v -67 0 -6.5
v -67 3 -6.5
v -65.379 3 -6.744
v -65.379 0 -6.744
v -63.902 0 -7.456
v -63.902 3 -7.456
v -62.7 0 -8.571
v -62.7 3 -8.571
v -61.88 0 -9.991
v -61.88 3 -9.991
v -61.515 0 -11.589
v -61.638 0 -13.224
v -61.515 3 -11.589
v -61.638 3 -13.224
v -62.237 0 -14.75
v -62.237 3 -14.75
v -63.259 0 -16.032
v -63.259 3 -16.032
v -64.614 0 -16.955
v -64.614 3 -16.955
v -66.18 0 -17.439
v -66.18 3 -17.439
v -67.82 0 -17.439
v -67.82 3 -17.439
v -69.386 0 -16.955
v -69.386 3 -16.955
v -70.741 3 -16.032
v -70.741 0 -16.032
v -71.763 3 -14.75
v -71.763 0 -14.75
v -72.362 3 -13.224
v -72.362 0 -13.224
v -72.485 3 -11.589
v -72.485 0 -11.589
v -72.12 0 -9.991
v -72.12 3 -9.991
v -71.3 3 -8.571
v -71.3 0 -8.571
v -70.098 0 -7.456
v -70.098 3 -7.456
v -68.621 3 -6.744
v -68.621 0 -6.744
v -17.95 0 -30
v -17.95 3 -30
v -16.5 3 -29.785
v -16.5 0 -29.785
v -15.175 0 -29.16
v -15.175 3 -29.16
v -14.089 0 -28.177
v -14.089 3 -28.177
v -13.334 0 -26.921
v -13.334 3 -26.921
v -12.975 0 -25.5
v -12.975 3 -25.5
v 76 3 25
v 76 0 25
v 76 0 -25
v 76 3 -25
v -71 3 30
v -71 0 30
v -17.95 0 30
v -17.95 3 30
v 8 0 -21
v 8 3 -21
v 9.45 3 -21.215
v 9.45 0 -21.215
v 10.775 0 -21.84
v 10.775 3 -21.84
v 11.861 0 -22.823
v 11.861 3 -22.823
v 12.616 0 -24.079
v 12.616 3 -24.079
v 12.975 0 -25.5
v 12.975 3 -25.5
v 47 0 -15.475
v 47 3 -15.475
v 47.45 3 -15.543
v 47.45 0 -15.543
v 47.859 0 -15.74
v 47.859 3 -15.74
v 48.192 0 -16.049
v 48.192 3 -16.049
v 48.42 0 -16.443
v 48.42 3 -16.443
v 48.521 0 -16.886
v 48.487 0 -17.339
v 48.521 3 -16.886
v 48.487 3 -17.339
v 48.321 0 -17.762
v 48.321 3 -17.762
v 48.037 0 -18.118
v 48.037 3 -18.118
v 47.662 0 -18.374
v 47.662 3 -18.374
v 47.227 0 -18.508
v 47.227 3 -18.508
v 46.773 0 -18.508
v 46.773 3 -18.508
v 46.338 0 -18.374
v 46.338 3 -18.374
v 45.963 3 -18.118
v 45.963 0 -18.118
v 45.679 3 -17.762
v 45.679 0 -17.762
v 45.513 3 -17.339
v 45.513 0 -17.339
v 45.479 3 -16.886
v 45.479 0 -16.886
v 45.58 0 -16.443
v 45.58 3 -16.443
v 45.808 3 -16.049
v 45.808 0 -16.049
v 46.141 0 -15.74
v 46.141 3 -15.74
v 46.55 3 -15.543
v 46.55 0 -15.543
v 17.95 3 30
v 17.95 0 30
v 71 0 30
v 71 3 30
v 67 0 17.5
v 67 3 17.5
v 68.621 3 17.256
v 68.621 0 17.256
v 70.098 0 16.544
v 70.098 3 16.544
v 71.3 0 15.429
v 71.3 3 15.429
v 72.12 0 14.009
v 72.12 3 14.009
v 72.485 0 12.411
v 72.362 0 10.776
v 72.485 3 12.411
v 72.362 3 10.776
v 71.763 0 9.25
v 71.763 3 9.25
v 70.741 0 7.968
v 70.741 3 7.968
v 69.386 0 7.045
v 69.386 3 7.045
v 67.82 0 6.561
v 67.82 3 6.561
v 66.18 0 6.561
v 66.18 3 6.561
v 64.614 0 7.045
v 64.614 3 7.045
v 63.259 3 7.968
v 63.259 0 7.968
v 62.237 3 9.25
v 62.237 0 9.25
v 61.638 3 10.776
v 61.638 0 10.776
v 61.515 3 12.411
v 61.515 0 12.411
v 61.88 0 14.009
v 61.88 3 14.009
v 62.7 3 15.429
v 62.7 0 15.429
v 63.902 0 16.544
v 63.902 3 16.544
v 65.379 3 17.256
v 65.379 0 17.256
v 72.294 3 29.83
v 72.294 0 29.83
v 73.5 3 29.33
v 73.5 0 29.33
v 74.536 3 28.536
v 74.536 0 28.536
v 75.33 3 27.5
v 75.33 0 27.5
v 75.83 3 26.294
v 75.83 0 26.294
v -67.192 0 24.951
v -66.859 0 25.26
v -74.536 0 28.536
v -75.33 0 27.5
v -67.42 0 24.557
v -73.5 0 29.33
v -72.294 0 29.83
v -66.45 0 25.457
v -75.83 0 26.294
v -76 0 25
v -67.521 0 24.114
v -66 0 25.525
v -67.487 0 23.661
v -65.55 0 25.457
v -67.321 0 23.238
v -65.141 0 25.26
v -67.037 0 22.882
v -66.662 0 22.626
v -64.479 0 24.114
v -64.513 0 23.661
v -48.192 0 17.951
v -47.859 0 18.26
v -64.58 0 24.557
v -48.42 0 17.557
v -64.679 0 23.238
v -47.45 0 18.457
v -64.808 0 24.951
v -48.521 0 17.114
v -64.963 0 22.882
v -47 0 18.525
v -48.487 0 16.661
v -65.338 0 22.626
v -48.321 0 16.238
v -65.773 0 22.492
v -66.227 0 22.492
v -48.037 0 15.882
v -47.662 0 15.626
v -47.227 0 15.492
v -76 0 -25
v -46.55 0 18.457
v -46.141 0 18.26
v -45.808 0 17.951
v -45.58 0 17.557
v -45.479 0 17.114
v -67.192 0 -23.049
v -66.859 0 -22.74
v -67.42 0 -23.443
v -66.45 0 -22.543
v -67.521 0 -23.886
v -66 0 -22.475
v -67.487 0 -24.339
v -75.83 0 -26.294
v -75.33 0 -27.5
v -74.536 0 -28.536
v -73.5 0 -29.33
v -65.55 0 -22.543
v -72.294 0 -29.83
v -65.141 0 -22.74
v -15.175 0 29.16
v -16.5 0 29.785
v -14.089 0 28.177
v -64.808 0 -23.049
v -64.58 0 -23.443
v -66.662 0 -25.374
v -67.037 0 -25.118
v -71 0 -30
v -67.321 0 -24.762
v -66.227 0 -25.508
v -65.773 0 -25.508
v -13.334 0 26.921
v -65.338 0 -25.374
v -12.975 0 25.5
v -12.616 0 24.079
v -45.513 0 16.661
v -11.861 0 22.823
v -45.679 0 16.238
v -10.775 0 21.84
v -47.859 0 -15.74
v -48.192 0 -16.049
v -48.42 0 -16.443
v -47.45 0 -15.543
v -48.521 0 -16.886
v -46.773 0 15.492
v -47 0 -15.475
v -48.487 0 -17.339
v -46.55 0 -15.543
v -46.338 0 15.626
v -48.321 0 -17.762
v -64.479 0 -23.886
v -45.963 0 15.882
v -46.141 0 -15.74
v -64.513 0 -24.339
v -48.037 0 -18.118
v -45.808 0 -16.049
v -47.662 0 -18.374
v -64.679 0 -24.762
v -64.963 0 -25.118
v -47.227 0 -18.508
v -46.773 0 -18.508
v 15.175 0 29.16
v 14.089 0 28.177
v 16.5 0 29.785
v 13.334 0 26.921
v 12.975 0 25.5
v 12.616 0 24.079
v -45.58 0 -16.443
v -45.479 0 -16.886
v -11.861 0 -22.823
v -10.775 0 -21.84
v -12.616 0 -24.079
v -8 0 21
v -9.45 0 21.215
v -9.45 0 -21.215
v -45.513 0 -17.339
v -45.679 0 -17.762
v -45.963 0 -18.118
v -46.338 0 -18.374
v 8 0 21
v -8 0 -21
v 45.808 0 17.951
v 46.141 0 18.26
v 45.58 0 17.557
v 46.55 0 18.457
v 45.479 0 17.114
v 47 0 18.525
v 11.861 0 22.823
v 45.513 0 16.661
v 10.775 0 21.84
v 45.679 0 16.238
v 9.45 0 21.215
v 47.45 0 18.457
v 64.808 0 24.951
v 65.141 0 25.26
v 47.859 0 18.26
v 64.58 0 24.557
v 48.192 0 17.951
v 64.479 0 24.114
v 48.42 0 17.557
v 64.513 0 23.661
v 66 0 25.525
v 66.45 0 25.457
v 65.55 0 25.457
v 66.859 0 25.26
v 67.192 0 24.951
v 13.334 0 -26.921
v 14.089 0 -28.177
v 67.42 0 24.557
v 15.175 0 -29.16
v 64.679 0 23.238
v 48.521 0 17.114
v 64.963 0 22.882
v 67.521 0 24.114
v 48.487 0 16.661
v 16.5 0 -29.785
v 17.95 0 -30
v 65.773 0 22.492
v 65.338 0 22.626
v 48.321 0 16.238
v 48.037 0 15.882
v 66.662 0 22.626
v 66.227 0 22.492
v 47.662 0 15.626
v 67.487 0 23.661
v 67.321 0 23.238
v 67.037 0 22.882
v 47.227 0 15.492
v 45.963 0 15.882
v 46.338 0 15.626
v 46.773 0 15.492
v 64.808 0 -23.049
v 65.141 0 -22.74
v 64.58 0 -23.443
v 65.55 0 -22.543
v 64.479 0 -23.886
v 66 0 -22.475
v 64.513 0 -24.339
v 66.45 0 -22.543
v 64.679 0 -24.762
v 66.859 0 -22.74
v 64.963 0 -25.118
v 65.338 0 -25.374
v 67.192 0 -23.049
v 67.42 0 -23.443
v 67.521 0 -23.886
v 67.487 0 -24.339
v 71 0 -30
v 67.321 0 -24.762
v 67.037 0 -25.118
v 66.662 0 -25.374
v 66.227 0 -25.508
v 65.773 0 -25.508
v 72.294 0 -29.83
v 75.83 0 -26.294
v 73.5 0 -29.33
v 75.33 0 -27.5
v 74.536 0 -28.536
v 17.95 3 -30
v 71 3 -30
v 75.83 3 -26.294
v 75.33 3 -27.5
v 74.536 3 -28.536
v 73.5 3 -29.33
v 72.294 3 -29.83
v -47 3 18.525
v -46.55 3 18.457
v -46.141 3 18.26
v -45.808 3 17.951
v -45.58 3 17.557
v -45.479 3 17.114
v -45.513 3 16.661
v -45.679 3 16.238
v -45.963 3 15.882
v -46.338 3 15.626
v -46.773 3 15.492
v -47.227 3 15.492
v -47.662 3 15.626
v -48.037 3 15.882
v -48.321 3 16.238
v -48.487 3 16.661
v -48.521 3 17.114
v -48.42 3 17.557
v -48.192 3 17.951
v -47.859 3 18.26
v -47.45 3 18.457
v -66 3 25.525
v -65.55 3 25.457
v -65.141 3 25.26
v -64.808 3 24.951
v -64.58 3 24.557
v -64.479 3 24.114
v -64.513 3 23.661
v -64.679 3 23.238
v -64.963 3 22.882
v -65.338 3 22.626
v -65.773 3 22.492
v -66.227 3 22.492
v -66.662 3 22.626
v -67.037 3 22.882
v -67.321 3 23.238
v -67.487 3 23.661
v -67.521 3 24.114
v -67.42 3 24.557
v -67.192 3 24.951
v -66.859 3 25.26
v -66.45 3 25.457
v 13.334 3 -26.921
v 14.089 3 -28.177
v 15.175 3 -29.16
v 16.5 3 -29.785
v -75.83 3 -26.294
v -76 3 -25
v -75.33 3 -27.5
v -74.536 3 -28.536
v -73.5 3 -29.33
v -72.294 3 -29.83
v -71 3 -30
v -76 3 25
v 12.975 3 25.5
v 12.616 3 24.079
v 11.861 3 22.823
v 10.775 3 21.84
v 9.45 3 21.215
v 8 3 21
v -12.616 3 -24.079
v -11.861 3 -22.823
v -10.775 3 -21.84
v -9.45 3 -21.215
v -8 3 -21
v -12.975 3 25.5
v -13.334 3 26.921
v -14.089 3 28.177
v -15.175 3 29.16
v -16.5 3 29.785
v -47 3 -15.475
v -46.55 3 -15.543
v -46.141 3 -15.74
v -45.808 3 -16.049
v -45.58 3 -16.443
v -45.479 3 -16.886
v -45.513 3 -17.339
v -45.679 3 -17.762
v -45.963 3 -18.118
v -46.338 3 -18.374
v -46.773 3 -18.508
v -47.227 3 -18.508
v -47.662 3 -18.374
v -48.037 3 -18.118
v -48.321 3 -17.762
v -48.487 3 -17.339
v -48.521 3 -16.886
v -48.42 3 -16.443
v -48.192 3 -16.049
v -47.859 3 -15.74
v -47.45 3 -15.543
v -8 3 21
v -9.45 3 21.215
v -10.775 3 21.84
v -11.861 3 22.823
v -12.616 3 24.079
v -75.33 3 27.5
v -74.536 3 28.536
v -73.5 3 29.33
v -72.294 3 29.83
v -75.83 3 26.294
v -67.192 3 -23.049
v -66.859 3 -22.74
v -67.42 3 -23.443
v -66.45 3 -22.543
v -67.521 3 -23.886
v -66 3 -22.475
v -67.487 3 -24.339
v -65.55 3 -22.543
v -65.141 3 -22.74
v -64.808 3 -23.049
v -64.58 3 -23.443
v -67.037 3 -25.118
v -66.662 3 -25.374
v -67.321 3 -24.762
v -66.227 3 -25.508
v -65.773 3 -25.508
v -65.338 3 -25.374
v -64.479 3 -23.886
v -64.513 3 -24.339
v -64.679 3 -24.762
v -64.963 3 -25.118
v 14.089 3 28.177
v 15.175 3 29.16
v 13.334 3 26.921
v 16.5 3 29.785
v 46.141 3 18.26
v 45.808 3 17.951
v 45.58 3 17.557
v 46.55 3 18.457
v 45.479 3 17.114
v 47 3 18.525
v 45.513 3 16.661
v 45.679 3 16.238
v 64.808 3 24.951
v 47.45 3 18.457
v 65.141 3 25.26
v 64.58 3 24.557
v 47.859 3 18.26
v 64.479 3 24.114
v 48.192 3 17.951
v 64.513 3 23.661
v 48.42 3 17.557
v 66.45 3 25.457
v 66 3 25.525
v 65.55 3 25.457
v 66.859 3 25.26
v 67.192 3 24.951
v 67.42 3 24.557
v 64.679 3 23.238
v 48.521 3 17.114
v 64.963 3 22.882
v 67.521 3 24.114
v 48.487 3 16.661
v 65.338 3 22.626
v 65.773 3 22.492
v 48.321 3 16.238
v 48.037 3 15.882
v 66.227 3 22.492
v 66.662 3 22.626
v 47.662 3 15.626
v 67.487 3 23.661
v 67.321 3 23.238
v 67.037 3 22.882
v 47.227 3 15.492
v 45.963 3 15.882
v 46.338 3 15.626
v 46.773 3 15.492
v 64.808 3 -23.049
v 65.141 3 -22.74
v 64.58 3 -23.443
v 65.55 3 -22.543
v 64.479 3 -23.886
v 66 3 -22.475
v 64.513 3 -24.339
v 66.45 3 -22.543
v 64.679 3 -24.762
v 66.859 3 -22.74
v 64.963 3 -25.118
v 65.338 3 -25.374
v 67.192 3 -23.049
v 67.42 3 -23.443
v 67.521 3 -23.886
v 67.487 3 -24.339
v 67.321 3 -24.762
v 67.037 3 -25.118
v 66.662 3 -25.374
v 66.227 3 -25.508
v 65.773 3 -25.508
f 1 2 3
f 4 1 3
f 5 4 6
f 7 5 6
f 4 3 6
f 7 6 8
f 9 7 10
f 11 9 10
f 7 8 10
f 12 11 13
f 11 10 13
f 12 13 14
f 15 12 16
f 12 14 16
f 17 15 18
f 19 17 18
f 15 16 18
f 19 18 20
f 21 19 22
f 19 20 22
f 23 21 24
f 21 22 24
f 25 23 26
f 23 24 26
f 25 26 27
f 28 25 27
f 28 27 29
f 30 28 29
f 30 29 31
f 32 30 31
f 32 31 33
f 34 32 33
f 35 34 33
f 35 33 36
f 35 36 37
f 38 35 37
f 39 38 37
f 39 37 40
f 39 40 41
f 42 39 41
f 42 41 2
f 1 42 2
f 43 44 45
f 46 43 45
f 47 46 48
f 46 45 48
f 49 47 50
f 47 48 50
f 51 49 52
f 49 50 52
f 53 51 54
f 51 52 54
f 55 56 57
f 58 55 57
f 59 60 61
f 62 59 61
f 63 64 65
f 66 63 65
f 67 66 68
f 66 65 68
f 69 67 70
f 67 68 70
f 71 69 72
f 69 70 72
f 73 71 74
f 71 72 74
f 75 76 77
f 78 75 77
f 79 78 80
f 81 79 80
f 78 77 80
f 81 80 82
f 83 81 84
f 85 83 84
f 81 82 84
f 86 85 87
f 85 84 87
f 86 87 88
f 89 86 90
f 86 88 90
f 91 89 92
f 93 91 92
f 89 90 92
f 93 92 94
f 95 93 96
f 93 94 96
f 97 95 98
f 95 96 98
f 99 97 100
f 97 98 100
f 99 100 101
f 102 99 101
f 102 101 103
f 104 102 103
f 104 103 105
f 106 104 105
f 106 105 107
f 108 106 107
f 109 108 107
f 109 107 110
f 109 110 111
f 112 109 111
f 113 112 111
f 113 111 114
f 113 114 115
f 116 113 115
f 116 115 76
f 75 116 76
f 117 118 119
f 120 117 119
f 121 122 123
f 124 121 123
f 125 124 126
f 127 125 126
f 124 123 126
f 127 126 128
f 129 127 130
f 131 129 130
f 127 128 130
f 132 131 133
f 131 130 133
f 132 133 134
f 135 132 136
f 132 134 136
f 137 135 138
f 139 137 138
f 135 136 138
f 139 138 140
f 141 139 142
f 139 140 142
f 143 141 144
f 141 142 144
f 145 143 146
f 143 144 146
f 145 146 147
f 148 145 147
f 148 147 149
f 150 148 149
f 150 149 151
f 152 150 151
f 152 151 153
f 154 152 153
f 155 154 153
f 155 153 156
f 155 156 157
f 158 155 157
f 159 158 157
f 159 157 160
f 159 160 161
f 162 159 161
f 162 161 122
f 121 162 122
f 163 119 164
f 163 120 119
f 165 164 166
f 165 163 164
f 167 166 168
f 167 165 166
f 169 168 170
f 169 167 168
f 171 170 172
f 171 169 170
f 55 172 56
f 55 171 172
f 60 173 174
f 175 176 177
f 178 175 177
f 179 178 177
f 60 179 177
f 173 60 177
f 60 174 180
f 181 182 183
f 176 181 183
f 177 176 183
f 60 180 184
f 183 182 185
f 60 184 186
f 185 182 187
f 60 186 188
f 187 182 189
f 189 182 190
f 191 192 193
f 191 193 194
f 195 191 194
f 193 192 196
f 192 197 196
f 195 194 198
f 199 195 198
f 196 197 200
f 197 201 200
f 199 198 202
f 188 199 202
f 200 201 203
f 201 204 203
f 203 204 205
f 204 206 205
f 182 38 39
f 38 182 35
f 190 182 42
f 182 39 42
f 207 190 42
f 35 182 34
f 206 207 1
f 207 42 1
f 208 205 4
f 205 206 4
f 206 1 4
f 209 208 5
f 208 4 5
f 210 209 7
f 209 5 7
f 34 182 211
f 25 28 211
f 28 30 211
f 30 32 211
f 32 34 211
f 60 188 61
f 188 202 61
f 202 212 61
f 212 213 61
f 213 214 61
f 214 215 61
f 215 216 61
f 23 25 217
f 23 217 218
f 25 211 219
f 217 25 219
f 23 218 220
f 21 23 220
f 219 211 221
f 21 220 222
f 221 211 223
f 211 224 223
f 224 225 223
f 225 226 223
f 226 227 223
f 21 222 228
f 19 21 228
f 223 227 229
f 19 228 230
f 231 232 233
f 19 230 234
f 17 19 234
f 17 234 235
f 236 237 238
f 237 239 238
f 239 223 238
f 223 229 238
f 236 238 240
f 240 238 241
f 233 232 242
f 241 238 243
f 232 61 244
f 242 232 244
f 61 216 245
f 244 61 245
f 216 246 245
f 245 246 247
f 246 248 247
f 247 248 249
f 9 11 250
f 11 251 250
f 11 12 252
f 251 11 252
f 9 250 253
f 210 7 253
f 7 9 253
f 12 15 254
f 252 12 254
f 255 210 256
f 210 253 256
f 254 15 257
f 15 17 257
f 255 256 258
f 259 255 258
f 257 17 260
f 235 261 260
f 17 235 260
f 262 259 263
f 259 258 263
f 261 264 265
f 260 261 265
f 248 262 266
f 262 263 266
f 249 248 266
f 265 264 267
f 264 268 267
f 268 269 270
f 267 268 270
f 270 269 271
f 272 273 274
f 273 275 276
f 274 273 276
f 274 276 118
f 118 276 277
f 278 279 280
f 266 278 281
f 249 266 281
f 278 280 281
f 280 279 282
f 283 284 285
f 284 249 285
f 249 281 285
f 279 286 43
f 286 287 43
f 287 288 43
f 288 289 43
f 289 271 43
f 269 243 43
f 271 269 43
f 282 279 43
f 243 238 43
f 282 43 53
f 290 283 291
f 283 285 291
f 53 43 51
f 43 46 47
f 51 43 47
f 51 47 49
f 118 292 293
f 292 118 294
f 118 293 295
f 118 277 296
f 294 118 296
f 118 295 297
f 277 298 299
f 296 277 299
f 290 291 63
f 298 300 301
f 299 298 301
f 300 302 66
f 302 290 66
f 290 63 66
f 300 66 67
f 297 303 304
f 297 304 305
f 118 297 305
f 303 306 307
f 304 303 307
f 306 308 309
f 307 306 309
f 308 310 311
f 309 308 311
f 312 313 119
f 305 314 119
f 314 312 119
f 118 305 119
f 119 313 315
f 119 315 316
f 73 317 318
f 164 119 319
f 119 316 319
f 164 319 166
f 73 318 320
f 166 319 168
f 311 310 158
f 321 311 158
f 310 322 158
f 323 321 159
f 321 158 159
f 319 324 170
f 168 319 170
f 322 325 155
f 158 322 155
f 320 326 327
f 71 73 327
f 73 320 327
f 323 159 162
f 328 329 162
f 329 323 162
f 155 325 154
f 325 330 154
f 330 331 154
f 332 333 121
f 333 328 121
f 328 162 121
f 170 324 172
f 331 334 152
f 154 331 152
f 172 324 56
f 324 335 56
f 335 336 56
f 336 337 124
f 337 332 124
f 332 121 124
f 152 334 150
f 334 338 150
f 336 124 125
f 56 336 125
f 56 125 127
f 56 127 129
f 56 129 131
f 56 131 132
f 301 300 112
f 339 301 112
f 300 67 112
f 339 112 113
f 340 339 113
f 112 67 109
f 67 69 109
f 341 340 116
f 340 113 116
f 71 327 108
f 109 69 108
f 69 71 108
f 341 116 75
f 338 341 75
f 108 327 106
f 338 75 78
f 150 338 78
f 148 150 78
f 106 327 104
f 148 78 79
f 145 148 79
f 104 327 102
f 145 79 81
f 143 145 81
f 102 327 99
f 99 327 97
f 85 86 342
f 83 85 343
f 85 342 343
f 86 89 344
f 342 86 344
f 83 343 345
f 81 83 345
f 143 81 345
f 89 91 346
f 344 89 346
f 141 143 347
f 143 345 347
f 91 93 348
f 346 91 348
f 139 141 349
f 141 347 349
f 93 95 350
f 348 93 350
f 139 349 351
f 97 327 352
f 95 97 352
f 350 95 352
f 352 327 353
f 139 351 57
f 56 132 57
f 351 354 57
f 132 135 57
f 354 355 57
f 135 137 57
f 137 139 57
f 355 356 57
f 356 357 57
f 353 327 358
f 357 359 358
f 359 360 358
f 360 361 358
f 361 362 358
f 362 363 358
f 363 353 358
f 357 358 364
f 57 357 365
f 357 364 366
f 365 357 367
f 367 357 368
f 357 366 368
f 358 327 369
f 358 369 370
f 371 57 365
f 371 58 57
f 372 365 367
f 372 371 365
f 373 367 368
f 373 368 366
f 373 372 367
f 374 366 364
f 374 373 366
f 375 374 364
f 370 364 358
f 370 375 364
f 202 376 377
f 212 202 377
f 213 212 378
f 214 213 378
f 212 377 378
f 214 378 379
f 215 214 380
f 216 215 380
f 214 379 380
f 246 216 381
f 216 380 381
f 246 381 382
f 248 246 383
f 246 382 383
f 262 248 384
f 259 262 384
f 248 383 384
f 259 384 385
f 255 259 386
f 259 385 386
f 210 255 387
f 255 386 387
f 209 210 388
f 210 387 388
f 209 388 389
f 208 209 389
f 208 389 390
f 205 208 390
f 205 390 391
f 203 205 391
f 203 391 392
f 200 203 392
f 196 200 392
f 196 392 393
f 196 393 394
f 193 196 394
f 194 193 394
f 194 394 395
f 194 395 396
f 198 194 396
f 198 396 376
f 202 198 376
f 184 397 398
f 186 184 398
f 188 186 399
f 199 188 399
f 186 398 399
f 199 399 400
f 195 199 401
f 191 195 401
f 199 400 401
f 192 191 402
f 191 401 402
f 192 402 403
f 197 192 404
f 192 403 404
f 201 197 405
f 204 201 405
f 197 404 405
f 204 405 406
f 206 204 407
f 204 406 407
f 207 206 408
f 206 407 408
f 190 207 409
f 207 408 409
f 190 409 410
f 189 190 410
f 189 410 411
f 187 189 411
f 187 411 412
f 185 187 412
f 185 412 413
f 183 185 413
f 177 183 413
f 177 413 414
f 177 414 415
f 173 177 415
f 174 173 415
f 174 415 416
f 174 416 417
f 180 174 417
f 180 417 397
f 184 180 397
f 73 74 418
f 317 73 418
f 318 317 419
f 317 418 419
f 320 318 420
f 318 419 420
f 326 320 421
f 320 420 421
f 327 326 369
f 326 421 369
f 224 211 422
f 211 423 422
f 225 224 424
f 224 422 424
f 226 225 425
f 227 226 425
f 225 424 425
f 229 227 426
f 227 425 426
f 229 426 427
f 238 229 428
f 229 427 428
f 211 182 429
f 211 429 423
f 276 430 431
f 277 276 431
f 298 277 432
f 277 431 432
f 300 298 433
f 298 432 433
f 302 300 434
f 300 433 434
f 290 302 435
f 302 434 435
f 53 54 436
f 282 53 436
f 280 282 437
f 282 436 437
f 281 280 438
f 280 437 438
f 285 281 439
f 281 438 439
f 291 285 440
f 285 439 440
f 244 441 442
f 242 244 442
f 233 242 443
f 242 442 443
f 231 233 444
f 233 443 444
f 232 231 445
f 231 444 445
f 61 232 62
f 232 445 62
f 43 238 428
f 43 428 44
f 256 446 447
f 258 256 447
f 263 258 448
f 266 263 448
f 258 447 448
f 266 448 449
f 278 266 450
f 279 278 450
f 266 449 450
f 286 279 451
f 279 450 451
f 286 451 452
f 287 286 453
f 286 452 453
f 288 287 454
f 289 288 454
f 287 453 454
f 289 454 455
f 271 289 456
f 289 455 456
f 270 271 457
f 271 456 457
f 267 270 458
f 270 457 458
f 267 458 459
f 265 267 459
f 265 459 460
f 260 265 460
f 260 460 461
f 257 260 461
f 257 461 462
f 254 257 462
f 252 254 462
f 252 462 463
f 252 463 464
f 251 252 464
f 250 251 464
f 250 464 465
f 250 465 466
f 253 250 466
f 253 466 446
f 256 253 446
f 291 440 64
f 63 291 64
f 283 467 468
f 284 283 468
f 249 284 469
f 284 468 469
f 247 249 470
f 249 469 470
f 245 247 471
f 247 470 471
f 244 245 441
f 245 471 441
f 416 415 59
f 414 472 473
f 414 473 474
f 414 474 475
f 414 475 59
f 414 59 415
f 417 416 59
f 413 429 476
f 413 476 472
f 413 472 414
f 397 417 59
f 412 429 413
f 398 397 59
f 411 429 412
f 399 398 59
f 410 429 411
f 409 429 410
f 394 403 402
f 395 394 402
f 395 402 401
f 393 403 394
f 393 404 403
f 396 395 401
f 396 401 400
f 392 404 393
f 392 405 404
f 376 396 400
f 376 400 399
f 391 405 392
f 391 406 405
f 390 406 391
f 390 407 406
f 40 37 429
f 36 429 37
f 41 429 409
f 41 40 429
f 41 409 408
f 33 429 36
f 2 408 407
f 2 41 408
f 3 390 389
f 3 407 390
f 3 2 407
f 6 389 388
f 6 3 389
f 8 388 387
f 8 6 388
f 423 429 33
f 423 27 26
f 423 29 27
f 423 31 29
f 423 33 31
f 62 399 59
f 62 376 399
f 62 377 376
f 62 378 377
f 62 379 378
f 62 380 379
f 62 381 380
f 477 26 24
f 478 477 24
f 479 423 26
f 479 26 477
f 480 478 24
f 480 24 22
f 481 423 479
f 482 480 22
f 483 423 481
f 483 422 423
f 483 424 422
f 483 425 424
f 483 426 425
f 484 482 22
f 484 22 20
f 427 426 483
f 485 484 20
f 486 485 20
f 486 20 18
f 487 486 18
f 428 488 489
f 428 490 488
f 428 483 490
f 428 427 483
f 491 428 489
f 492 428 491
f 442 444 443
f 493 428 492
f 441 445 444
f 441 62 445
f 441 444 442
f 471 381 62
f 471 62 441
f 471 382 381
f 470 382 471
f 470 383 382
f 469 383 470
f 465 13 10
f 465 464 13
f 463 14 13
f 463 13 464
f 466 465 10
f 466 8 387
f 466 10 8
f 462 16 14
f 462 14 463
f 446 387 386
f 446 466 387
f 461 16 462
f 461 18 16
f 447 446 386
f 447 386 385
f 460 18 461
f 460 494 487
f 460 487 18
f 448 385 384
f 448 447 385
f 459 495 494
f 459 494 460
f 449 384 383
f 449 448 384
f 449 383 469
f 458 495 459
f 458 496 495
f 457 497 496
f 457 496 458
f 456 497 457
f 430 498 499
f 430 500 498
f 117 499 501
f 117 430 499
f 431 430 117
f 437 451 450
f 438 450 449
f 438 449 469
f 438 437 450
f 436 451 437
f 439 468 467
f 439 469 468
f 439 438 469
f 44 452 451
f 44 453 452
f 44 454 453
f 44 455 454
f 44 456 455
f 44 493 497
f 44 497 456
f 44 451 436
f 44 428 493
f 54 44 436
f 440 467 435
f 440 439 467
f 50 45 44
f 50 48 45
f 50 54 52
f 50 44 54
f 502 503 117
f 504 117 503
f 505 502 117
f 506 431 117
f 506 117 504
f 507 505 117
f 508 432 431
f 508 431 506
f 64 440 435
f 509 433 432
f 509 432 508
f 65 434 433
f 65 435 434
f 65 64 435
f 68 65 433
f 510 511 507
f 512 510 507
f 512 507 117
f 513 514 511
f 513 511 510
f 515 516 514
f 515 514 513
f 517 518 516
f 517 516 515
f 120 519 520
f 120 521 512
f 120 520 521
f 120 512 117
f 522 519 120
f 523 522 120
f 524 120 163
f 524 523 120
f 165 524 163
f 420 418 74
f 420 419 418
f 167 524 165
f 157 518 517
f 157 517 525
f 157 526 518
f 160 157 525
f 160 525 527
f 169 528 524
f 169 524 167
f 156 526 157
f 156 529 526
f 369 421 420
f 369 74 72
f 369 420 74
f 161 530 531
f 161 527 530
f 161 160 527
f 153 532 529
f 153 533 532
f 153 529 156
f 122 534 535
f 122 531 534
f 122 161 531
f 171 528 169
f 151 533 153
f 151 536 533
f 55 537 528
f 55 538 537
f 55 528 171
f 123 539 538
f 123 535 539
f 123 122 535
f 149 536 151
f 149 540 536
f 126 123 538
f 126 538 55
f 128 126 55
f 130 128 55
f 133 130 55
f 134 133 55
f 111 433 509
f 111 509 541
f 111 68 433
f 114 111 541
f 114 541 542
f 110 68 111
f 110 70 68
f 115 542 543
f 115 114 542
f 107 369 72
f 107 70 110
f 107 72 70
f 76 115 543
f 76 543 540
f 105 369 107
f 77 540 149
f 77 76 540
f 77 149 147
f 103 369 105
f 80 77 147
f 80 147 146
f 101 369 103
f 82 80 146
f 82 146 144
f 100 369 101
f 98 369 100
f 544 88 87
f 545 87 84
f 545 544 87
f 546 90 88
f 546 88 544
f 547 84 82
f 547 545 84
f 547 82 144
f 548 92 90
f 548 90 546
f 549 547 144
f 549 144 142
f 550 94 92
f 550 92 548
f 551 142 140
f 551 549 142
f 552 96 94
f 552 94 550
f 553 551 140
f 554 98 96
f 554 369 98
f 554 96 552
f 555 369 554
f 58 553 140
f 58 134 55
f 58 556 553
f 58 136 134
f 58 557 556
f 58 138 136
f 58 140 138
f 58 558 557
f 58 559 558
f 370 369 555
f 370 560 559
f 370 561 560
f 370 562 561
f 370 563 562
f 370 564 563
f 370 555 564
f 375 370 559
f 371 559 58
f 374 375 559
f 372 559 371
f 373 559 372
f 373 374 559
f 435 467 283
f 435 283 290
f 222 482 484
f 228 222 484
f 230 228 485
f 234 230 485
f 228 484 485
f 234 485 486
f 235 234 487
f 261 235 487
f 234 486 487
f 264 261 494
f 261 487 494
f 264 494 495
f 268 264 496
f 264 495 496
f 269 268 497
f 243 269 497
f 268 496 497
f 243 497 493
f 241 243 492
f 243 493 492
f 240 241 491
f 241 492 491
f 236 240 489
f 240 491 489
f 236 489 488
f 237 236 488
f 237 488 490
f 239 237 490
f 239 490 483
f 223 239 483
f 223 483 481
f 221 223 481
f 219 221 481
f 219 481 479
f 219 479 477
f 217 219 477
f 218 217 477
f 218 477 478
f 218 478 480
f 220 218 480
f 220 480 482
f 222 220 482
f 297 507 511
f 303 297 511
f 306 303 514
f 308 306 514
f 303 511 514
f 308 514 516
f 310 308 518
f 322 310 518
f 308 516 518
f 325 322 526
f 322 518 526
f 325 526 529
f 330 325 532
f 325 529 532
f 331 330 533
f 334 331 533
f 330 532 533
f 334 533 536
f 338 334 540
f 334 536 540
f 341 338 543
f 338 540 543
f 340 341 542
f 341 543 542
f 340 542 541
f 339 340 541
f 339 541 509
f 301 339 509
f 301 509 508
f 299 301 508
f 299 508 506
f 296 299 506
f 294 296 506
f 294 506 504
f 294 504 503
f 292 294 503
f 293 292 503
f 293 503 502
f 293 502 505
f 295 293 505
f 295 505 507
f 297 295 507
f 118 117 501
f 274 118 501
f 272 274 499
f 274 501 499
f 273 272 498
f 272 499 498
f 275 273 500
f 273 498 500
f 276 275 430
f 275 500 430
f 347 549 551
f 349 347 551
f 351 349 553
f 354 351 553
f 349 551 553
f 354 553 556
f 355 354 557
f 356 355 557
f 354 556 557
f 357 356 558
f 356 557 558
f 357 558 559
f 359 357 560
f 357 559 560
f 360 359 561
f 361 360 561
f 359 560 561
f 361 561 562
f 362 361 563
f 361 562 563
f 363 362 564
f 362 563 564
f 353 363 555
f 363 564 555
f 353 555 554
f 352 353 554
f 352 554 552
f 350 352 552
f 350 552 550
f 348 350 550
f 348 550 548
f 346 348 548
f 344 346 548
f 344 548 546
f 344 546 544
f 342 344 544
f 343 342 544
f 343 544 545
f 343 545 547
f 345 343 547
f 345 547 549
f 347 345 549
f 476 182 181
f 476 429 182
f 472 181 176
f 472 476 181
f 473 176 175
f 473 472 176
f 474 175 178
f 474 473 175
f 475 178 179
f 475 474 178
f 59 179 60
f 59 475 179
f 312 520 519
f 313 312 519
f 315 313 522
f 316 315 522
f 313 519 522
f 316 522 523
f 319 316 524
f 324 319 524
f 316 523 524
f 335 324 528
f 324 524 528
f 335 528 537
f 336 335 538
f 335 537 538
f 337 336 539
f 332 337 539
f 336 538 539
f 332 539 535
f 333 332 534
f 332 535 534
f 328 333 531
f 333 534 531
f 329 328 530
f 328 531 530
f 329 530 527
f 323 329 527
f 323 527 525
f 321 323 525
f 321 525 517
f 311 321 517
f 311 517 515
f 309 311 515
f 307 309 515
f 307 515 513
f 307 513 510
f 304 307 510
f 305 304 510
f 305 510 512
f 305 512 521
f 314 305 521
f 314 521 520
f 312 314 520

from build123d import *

# Parameters (mm, degrees)
SKETCH_1_W          = 152
SKETCH_1_H          = 60
EXTRUDE_1_DEPTH     = 3
FILLET_1_R          = 5
CUT_EXTRUDE_1_REACH = 83.762
SKETCH_2_R          = 1.525
CUT_EXTRUDE_2_REACH = 83.762
SKETCH_3_W          = 16
SKETCH_3_H          = 9
CUT_EXTRUDE_3_REACH = 83.762
SKETCH_4_R          = 1.525
CUT_EXTRUDE_4_REACH = 83.762
SKETCH_5_R          = 5.5


with BuildPart() as part:
    # 草图1 → 凸台-拉伸1 (new body)
    with BuildSketch(Plane(origin=(0, 0, 0), x_dir=(1, 0, 0), z_dir=(0, 1, 0))):
        Rectangle(SKETCH_1_W, SKETCH_1_H)
    extrude(amount=EXTRUDE_1_DEPTH)

    # 圆角1
    fillet_1_edges = [part.edges().sort_by_distance(p)[0] for p in [
        (76, 1.5, 30),
        (-76, 1.5, 30),
        (-76, 1.5, -30),
        (76, 1.5, -30),
    ]]
    fillet(fillet_1_edges, radius=FILLET_1_R)

    # 草图2 → 切除-拉伸1 (cut, up to next)
    with BuildSketch(Plane(origin=(0, 3, 0), x_dir=(1, 0, 0), z_dir=(0, 1, 0)), mode=Mode.PRIVATE) as cut_extrude_1_sk1:
        with Locations(Location((-66, -24, 0), (0, 0, 270))):
            Circle(SKETCH_2_R)
    cut_extrude_1_tool1 = extrude(cut_extrude_1_sk1.sketch, amount=-CUT_EXTRUDE_1_REACH, mode=Mode.PRIVATE) & part.part
    # 草图2 → 切除-拉伸1 (cut, up to next)
    with BuildSketch(Plane(origin=(0, 3, 0), x_dir=(1, 0, 0), z_dir=(0, 1, 0)), mode=Mode.PRIVATE) as cut_extrude_1_sk2:
        with Locations(Location((66, -24, 0), (0, 0, 270))):
            Circle(SKETCH_2_R)
    cut_extrude_1_tool2 = extrude(cut_extrude_1_sk2.sketch, amount=-CUT_EXTRUDE_1_REACH, mode=Mode.PRIVATE) & part.part
    # 草图2 → 切除-拉伸1 (cut, up to next)
    with BuildSketch(Plane(origin=(0, 3, 0), x_dir=(1, 0, 0), z_dir=(0, 1, 0)), mode=Mode.PRIVATE) as cut_extrude_1_sk3:
        with Locations(Location((66, 24, 0), (0, 0, 270))):
            Circle(SKETCH_2_R)
    cut_extrude_1_tool3 = extrude(cut_extrude_1_sk3.sketch, amount=-CUT_EXTRUDE_1_REACH, mode=Mode.PRIVATE) & part.part
    # 草图2 → 切除-拉伸1 (cut, up to next)
    with BuildSketch(Plane(origin=(0, 3, 0), x_dir=(1, 0, 0), z_dir=(0, 1, 0)), mode=Mode.PRIVATE) as cut_extrude_1_sk4:
        with Locations(Location((-66, 24, 0), (0, 0, 270))):
            Circle(SKETCH_2_R)
    cut_extrude_1_tool4 = extrude(cut_extrude_1_sk4.sketch, amount=-CUT_EXTRUDE_1_REACH, mode=Mode.PRIVATE) & part.part
    add(cut_extrude_1_tool1.solids().sort_by_distance((-66, 3, 24))[0], mode=Mode.SUBTRACT)
    add(cut_extrude_1_tool2.solids().sort_by_distance((66, 3, 24))[0], mode=Mode.SUBTRACT)
    add(cut_extrude_1_tool3.solids().sort_by_distance((66, 3, -24))[0], mode=Mode.SUBTRACT)
    add(cut_extrude_1_tool4.solids().sort_by_distance((-66, 3, -24))[0], mode=Mode.SUBTRACT)

    # 草图3 → 切除-拉伸2 (cut, up to next)
    with BuildSketch(Plane(origin=(0, 3, 0), x_dir=(1, 0, 0), z_dir=(0, 1, 0)), mode=Mode.PRIVATE) as cut_extrude_2_sk1:
        with BuildLine():
            Line((-8, -30), (-8, -21))
            ThreePointArc((-8, -21), (-11.354101966, -22.291900756), (-12.974937186, -25.5))
            ThreePointArc((-12.974937186, -25.5), (-14.595772405, -28.708099244), (-17.949874371, -30))
            Line((-17.949874371, -30), (-8, -30))
        make_face()
    cut_extrude_2_tool1 = extrude(cut_extrude_2_sk1.sketch, amount=-CUT_EXTRUDE_2_REACH, mode=Mode.PRIVATE) & part.part
    # 草图3 → 切除-拉伸2 (cut, up to next)
    with BuildSketch(Plane(origin=(0, 3, 0), x_dir=(1, 0, 0), z_dir=(0, 1, 0)), mode=Mode.PRIVATE) as cut_extrude_2_sk2:
        with Locations((0, -25.5)):
            Rectangle(SKETCH_3_W, SKETCH_3_H)
    cut_extrude_2_tool2 = extrude(cut_extrude_2_sk2.sketch, amount=-CUT_EXTRUDE_2_REACH, mode=Mode.PRIVATE) & part.part
    # 草图3 → 切除-拉伸2 (cut, up to next)
    with BuildSketch(Plane(origin=(0, 3, 0), x_dir=(1, 0, 0), z_dir=(0, 1, 0)), mode=Mode.PRIVATE) as cut_extrude_2_sk3:
        with BuildLine():
            ThreePointArc((12.974937186, -25.5), (11.354101966, -22.291900756), (8, -21))
            Line((8, -21), (8, -30))
            Line((8, -30), (17.949874371, -30))
            ThreePointArc((17.949874371, -30), (14.595772405, -28.708099244), (12.974937186, -25.5))
        make_face()
    cut_extrude_2_tool3 = extrude(cut_extrude_2_sk3.sketch, amount=-CUT_EXTRUDE_2_REACH, mode=Mode.PRIVATE) & part.part
    # 草图3 → 切除-拉伸2 (cut, up to next)
    with BuildSketch(Plane(origin=(0, 3, 0), x_dir=(1, 0, 0), z_dir=(0, 1, 0)), mode=Mode.PRIVATE) as cut_extrude_2_sk4:
        with BuildLine():
            ThreePointArc((-12.974937186, 25.5), (-11.354101966, 22.291900756), (-8, 21))
            Line((-8, 21), (-8, 30))
            Line((-8, 30), (-17.949874371, 30))
            ThreePointArc((-17.949874371, 30), (-14.595772405, 28.708099244), (-12.974937186, 25.5))
        make_face()
    cut_extrude_2_tool4 = extrude(cut_extrude_2_sk4.sketch, amount=-CUT_EXTRUDE_2_REACH, mode=Mode.PRIVATE) & part.part
    # 草图3 → 切除-拉伸2 (cut, up to next)
    with BuildSketch(Plane(origin=(0, 3, 0), x_dir=(1, 0, 0), z_dir=(0, 1, 0)), mode=Mode.PRIVATE) as cut_extrude_2_sk5:
        with Locations((0, 25.5)):
            Rectangle(SKETCH_3_W, SKETCH_3_H)
    cut_extrude_2_tool5 = extrude(cut_extrude_2_sk5.sketch, amount=-CUT_EXTRUDE_2_REACH, mode=Mode.PRIVATE) & part.part
    # 草图3 → 切除-拉伸2 (cut, up to next)
    with BuildSketch(Plane(origin=(0, 3, 0), x_dir=(1, 0, 0), z_dir=(0, 1, 0)), mode=Mode.PRIVATE) as cut_extrude_2_sk6:
        with BuildLine():
            Line((8, 30), (8, 21))
            ThreePointArc((8, 21), (11.354101966, 22.291900756), (12.974937186, 25.5))
            ThreePointArc((12.974937186, 25.5), (14.595772405, 28.708099244), (17.949874371, 30))
            Line((17.949874371, 30), (8, 30))
        make_face()
    cut_extrude_2_tool6 = extrude(cut_extrude_2_sk6.sketch, amount=-CUT_EXTRUDE_2_REACH, mode=Mode.PRIVATE) & part.part
    add(cut_extrude_2_tool1.solids().sort_by_distance((-10.749177, 3, 26.299455))[0], mode=Mode.SUBTRACT)
    add(cut_extrude_2_tool2.solids().sort_by_distance((0, 3, 25.5))[0], mode=Mode.SUBTRACT)
    add(cut_extrude_2_tool3.solids().sort_by_distance((10.749177, 3, 26.299455))[0], mode=Mode.SUBTRACT)
    add(cut_extrude_2_tool4.solids().sort_by_distance((-10.749177, 3, -26.299455))[0], mode=Mode.SUBTRACT)
    add(cut_extrude_2_tool5.solids().sort_by_distance((0, 3, -25.5))[0], mode=Mode.SUBTRACT)
    add(cut_extrude_2_tool6.solids().sort_by_distance((10.749177, 3, -26.299455))[0], mode=Mode.SUBTRACT)

    # 草图4 → 切除-拉伸3 (cut, up to next)
    with BuildSketch(Plane(origin=(0, 3, 0), x_dir=(1, 0, 0), z_dir=(0, 1, 0)), mode=Mode.PRIVATE) as cut_extrude_3_sk1:
        with Locations(Location((-47, -17, 0), (0, 0, 270))):
            Circle(SKETCH_4_R)
    cut_extrude_3_tool1 = extrude(cut_extrude_3_sk1.sketch, amount=-CUT_EXTRUDE_3_REACH, mode=Mode.PRIVATE) & part.part
    # 草图4 → 切除-拉伸3 (cut, up to next)
    with BuildSketch(Plane(origin=(0, 3, 0), x_dir=(1, 0, 0), z_dir=(0, 1, 0)), mode=Mode.PRIVATE) as cut_extrude_3_sk2:
        with Locations(Location((-47, 17, 0), (0, 0, 270))):
            Circle(SKETCH_4_R)
    cut_extrude_3_tool2 = extrude(cut_extrude_3_sk2.sketch, amount=-CUT_EXTRUDE_3_REACH, mode=Mode.PRIVATE) & part.part
    # 草图4 → 切除-拉伸3 (cut, up to next)
    with BuildSketch(Plane(origin=(0, 3, 0), x_dir=(1, 0, 0), z_dir=(0, 1, 0)), mode=Mode.PRIVATE) as cut_extrude_3_sk3:
        with Locations(Location((47, -17, 0), (0, 0, 270))):
            Circle(SKETCH_4_R)
    cut_extrude_3_tool3 = extrude(cut_extrude_3_sk3.sketch, amount=-CUT_EXTRUDE_3_REACH, mode=Mode.PRIVATE) & part.part
    # 草图4 → 切除-拉伸3 (cut, up to next)
    with BuildSketch(Plane(origin=(0, 3, 0), x_dir=(1, 0, 0), z_dir=(0, 1, 0)), mode=Mode.PRIVATE) as cut_extrude_3_sk4:
        with Locations(Location((47, 17, 0), (0, 0, 270))):
            Circle(SKETCH_4_R)
    cut_extrude_3_tool4 = extrude(cut_extrude_3_sk4.sketch, amount=-CUT_EXTRUDE_3_REACH, mode=Mode.PRIVATE) & part.part
    add(cut_extrude_3_tool1.solids().sort_by_distance((-47, 3, 17))[0], mode=Mode.SUBTRACT)
    add(cut_extrude_3_tool2.solids().sort_by_distance((-47, 3, -17))[0], mode=Mode.SUBTRACT)
    add(cut_extrude_3_tool3.solids().sort_by_distance((47, 3, 17))[0], mode=Mode.SUBTRACT)
    add(cut_extrude_3_tool4.solids().sort_by_distance((47, 3, -17))[0], mode=Mode.SUBTRACT)

    # 草图5 → 切除-拉伸4 (cut, up to next)
    with BuildSketch(Plane(origin=(0, 3, 0), x_dir=(1, 0, 0), z_dir=(0, 1, 0)), mode=Mode.PRIVATE) as cut_extrude_4_sk1:
        with Locations(Location((-67, 12, 0), (0, 0, 270))):
            Circle(SKETCH_5_R)
    cut_extrude_4_tool1 = extrude(cut_extrude_4_sk1.sketch, amount=-CUT_EXTRUDE_4_REACH, mode=Mode.PRIVATE) & part.part
    # 草图5 → 切除-拉伸4 (cut, up to next)
    with BuildSketch(Plane(origin=(0, 3, 0), x_dir=(1, 0, 0), z_dir=(0, 1, 0)), mode=Mode.PRIVATE) as cut_extrude_4_sk2:
        with Locations(Location((67, -12, 0), (0, 0, 270))):
            Circle(SKETCH_5_R)
    cut_extrude_4_tool2 = extrude(cut_extrude_4_sk2.sketch, amount=-CUT_EXTRUDE_4_REACH, mode=Mode.PRIVATE) & part.part
    add(cut_extrude_4_tool1.solids().sort_by_distance((-67, 3, -12))[0], mode=Mode.SUBTRACT)
    add(cut_extrude_4_tool2.solids().sort_by_distance((67, 3, 12))[0], mode=Mode.SUBTRACT)


solid = part.part
